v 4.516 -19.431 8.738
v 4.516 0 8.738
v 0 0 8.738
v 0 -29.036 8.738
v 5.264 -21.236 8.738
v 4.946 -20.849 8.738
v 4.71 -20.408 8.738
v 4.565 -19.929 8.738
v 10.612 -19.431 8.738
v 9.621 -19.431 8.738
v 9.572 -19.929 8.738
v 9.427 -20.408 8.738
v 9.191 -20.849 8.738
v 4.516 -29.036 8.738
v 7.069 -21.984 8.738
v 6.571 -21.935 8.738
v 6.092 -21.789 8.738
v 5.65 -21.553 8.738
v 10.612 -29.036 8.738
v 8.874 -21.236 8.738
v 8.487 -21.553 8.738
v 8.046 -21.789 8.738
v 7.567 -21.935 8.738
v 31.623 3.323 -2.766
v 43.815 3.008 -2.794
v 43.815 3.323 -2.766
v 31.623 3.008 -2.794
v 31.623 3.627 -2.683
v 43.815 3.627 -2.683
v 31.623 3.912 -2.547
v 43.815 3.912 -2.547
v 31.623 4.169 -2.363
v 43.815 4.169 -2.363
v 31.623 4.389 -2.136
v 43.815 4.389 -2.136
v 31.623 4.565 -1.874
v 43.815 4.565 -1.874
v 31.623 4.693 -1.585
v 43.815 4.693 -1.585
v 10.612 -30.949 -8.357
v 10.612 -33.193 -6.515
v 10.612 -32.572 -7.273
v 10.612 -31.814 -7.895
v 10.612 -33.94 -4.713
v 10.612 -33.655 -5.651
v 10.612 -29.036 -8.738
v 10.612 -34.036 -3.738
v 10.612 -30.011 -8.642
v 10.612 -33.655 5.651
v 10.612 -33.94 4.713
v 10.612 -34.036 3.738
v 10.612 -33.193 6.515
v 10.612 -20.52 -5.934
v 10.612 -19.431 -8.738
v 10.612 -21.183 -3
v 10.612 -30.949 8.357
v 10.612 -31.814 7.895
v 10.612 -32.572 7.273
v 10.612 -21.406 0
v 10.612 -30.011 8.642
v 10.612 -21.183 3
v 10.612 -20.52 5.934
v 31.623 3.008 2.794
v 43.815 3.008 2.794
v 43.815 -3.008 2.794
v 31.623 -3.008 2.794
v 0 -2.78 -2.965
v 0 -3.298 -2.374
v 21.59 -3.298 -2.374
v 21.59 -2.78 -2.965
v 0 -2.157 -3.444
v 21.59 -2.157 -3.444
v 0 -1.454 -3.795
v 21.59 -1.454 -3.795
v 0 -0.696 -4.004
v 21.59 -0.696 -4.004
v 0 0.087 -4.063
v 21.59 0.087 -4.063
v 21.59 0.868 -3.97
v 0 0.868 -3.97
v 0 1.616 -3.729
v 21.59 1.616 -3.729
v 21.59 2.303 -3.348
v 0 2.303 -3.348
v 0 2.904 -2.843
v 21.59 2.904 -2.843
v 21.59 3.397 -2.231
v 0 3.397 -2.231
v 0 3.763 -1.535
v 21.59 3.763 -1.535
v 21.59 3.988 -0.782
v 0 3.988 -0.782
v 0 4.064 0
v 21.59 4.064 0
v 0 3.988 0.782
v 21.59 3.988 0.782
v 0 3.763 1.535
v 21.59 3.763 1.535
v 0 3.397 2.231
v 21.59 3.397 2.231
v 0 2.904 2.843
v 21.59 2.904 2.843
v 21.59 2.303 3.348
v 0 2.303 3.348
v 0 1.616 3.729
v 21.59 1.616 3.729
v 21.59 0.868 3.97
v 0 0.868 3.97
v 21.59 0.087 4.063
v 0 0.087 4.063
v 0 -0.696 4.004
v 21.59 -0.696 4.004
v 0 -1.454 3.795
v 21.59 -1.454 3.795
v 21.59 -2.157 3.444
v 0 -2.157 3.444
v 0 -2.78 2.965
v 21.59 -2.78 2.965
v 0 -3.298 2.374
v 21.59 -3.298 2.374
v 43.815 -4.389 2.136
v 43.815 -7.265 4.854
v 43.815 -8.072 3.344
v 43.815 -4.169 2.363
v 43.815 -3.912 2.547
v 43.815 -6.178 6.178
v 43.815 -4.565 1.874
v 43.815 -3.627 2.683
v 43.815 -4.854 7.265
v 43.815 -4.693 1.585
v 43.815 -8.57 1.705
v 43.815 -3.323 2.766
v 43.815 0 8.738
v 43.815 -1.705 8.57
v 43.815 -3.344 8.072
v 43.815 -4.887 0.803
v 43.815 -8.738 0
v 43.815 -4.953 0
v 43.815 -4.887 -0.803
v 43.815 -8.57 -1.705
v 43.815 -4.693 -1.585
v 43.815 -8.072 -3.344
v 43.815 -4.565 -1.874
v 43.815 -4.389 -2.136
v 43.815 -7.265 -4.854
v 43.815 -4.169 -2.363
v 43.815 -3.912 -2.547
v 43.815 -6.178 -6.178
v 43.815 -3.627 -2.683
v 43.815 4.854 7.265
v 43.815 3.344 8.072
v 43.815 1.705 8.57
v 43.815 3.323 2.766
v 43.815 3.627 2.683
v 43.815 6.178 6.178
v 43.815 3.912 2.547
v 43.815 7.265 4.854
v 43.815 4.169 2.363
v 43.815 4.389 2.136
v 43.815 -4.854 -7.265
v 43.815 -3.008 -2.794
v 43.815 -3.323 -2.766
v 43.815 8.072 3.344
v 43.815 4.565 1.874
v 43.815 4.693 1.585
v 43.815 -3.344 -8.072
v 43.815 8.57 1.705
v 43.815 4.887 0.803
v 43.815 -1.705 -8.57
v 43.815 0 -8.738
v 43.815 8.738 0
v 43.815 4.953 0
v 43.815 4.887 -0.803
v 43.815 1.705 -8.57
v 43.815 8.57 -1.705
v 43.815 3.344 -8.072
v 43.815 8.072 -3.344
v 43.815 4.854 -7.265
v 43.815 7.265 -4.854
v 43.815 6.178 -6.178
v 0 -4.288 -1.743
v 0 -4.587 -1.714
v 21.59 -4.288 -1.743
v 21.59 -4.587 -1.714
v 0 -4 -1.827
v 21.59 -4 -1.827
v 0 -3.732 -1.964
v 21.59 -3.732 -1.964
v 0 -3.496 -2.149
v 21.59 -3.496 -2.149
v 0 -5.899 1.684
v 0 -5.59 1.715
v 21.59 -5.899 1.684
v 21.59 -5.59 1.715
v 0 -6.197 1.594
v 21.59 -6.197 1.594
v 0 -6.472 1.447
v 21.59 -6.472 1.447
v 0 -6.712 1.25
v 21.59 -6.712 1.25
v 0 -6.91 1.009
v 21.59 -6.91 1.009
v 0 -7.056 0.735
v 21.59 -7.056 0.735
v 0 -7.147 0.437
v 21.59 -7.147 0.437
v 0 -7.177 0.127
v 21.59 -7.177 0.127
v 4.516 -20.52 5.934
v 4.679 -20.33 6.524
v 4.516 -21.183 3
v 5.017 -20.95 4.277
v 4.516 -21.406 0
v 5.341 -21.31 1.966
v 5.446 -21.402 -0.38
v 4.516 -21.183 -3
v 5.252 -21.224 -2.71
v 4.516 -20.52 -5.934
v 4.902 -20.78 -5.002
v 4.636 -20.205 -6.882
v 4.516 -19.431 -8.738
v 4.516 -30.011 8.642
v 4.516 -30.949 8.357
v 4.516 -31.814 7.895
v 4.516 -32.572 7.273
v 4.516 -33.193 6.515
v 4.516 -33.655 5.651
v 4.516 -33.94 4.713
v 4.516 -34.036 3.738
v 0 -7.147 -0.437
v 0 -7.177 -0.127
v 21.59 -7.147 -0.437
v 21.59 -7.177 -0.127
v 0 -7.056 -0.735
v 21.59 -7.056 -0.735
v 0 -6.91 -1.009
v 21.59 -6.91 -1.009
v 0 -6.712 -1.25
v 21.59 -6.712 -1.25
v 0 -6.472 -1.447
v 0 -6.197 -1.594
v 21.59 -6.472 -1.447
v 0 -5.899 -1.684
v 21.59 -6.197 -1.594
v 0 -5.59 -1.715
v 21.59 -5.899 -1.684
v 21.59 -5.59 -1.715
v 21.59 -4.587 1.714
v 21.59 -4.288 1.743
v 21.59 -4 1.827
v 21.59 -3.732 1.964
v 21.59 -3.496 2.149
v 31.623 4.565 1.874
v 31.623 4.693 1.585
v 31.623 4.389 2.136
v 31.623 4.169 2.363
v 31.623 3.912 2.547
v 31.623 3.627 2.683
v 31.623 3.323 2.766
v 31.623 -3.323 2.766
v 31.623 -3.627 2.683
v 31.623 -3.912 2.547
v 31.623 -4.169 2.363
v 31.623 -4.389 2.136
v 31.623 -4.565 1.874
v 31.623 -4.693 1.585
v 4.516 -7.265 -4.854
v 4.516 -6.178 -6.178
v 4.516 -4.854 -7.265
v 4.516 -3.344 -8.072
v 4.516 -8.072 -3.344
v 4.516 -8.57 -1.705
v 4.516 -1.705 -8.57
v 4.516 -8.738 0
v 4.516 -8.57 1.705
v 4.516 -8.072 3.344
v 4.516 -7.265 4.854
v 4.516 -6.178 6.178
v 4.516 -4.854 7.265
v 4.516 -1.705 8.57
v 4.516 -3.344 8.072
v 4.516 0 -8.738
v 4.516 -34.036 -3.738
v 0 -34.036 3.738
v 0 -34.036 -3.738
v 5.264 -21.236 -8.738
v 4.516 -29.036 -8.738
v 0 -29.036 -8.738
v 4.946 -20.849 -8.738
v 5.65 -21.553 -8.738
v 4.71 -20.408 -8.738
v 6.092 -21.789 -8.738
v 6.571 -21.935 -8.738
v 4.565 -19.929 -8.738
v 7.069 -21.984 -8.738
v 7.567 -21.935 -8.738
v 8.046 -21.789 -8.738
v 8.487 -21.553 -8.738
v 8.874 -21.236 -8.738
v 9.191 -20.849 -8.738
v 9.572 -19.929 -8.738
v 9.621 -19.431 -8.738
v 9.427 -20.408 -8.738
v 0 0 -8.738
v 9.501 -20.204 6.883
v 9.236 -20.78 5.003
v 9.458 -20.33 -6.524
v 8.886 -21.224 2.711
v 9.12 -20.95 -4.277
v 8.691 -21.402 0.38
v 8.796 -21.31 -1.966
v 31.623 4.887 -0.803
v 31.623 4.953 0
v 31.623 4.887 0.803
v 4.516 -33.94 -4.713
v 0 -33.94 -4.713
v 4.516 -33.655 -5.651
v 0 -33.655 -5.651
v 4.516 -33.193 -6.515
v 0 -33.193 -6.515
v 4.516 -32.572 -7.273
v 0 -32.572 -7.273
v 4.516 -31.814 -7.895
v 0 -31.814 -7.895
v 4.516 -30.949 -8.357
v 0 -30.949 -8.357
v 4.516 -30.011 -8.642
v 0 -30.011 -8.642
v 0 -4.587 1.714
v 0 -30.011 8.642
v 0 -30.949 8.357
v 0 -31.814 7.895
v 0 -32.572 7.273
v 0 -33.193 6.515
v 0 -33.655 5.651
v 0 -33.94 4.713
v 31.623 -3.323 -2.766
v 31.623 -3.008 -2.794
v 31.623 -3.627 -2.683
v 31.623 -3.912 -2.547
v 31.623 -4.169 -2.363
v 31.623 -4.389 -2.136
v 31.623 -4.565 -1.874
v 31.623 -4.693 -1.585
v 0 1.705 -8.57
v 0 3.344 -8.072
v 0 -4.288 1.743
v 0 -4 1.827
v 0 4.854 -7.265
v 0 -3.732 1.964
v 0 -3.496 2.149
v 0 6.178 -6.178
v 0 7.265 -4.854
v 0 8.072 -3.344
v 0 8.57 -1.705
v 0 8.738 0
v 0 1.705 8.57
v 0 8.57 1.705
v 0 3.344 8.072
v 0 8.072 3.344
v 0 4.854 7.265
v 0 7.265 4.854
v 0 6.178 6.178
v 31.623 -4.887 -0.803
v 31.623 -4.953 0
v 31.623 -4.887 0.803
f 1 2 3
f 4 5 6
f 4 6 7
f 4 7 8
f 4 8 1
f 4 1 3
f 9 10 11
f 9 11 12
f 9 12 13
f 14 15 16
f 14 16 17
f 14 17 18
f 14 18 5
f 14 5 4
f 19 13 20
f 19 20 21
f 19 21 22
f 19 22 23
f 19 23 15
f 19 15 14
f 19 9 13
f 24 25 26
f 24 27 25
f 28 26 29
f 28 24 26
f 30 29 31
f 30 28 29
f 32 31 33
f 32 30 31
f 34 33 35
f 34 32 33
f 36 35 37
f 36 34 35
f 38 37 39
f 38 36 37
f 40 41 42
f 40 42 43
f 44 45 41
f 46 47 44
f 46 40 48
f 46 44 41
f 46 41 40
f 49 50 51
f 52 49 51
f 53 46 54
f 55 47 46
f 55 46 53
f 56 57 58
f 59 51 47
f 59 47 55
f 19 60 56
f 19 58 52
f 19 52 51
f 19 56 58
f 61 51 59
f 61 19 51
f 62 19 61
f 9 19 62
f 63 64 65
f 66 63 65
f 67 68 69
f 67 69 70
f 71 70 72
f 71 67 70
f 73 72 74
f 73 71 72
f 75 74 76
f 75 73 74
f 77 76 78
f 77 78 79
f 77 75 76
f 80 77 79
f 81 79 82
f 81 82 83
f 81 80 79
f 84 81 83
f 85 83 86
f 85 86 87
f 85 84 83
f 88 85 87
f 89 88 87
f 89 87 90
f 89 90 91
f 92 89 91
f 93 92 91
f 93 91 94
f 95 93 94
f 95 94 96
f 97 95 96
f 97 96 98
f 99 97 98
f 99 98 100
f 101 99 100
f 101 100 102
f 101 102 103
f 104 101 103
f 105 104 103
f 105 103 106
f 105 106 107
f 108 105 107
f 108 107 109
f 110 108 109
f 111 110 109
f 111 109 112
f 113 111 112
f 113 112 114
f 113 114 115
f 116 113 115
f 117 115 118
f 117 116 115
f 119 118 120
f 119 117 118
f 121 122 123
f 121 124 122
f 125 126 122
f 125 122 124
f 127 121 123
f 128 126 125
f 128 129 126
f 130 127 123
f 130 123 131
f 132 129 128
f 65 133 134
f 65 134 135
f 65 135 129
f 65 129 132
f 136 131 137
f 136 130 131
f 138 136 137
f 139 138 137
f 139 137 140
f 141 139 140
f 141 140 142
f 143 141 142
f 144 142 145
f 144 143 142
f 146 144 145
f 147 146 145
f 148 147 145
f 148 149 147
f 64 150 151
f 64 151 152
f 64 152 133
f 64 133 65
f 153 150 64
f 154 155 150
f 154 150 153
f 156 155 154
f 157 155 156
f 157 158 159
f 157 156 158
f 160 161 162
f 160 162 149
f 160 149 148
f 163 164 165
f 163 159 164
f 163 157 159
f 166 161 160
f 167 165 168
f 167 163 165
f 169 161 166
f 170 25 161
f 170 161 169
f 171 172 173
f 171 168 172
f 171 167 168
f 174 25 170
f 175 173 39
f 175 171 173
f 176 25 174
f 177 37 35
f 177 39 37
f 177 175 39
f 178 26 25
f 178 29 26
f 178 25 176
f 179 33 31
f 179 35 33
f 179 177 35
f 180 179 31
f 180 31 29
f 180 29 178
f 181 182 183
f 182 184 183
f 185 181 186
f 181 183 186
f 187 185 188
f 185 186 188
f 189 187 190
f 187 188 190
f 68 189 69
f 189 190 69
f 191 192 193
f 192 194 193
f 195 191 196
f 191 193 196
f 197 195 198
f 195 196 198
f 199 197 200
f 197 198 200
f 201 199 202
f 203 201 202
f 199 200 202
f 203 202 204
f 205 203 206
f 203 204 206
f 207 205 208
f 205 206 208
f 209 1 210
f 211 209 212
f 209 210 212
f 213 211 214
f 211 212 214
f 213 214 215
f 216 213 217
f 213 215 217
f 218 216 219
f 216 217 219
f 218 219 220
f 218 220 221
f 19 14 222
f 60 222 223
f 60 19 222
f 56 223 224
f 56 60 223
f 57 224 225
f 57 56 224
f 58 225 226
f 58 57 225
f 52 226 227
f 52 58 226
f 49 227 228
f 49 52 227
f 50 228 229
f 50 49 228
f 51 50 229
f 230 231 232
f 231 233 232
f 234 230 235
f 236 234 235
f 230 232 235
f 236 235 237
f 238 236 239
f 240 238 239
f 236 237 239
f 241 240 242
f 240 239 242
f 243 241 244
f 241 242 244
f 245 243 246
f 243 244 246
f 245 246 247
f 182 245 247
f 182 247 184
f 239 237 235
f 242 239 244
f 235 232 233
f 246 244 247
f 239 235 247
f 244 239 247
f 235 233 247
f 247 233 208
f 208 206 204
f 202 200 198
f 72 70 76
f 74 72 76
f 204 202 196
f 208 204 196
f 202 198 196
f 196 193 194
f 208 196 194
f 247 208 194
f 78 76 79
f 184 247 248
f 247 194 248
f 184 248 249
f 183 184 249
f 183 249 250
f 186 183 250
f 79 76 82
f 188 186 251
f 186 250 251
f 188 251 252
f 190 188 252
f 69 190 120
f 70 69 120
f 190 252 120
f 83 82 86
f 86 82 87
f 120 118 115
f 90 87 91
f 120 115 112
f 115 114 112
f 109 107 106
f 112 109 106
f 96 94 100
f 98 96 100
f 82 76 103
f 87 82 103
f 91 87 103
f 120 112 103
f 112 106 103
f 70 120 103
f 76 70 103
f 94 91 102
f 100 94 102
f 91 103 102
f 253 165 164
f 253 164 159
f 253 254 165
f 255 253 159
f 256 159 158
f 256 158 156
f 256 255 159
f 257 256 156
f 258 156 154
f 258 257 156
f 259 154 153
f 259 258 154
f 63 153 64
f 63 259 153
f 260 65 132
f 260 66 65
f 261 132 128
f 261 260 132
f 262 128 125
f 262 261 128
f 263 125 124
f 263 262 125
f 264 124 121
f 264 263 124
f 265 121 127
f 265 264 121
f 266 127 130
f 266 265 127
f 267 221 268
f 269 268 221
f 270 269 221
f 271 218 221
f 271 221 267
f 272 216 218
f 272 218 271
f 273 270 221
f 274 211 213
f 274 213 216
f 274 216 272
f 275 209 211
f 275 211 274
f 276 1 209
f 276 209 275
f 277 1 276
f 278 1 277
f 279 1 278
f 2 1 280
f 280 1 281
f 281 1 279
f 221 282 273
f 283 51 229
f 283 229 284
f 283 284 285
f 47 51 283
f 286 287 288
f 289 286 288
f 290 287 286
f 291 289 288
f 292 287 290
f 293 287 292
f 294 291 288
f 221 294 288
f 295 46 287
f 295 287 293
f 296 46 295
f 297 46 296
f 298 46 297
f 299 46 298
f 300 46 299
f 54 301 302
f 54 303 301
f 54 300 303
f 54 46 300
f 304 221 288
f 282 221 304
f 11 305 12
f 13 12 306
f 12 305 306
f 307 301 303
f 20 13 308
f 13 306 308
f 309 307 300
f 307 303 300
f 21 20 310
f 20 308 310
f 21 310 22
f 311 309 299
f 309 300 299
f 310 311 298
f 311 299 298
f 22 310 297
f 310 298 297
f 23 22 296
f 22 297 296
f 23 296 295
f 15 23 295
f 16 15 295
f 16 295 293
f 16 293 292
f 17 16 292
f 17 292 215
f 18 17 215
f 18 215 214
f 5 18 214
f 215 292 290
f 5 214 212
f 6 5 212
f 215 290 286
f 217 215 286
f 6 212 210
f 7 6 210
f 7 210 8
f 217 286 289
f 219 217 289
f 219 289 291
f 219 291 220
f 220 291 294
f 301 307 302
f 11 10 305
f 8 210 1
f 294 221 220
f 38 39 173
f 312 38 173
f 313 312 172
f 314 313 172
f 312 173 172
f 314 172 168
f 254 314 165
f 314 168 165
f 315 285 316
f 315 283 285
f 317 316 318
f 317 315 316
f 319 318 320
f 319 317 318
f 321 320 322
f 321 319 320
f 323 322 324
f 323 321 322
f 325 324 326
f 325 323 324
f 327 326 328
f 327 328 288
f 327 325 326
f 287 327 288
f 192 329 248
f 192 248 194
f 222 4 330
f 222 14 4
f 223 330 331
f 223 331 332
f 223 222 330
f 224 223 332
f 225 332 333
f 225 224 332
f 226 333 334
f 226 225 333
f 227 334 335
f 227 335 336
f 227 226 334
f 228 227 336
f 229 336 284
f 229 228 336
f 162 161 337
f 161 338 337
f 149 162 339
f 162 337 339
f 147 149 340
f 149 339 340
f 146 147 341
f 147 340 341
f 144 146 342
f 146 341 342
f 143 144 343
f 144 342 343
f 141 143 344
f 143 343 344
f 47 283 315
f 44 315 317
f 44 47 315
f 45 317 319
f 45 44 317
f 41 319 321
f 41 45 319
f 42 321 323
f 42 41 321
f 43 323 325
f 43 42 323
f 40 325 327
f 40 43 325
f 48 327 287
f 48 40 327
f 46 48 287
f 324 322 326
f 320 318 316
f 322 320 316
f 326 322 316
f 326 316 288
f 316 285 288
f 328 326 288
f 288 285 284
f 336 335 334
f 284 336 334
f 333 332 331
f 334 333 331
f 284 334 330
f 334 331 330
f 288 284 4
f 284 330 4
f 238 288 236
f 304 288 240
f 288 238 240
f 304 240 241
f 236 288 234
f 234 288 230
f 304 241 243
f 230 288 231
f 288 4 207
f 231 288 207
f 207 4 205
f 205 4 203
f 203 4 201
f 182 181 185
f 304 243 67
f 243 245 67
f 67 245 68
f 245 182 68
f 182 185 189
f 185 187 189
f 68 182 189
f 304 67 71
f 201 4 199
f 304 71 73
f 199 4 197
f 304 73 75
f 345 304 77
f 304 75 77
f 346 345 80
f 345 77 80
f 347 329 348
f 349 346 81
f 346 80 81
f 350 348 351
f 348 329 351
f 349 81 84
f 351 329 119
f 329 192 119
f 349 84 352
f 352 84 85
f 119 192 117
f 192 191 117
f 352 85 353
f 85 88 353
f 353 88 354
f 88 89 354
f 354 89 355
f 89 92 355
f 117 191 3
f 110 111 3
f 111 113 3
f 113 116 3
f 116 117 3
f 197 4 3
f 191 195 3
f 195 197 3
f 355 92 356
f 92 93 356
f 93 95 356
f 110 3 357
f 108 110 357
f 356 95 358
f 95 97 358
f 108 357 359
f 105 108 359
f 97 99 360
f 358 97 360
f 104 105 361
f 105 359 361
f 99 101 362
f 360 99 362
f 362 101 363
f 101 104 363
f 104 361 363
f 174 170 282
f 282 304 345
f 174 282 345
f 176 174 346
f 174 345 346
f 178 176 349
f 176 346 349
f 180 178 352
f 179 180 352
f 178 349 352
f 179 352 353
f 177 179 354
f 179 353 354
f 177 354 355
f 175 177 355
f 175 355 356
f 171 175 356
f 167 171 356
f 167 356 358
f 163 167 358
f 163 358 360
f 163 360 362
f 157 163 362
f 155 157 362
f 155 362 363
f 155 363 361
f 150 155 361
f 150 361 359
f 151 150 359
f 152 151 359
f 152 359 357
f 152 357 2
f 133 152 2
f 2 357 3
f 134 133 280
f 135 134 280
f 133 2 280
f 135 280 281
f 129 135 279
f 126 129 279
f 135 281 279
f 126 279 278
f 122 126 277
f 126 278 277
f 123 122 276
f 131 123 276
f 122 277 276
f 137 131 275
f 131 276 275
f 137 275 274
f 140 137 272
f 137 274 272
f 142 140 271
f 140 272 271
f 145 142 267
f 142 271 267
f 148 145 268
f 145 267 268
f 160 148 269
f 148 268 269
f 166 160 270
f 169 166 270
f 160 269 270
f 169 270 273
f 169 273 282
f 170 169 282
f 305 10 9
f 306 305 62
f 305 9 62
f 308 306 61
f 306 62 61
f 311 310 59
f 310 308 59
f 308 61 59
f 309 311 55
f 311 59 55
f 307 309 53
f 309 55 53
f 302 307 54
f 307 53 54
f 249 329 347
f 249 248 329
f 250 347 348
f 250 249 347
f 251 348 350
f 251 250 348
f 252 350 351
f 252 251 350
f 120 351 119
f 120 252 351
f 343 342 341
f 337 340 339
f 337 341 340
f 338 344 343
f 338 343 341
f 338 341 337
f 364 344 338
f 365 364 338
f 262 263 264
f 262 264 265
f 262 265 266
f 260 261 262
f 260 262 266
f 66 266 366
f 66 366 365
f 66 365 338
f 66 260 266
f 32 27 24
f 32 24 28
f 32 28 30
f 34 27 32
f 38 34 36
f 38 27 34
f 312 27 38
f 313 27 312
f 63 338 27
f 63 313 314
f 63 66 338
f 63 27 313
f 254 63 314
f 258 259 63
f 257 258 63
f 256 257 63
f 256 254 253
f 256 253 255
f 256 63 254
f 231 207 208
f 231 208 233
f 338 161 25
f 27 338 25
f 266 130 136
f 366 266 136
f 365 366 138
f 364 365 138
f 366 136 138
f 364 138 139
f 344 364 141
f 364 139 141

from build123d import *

# Parameters (mm, degrees)
SKETCH1_R           = 8.7376
BOSS_EXTRUDE1_DEPTH = 43.815
BOSS_EXTRUDE3_DEPTH = 4.516000112
FILLET2_R           = 5
BOSS_EXTRUDE4_START = 6.096
BOSS_EXTRUDE4_DEPTH = 6.096
CUT_EXTRUDE8_DEPTH  = 6.096
CUT_EXTRUDE10_DEPTH = 12.192
FILLET11_R          = 1.778
SKETCH25_R          = 2.5527
CUT_EXTRUDE14_DEPTH = 59.168600946
CUT_EXTRUDE15_DEPTH = 21.59
FILLET12_R          = 1.5875


with BuildPart() as part:
    # Sketch1 → Boss-Extrude1 (new body)
    with BuildSketch(Plane.YZ):
        with Locations(Location((0, 0, 0), (0, 0, 270))):
            Circle(SKETCH1_R)
    extrude(amount=BOSS_EXTRUDE1_DEPTH)

    # Sketch10 → Boss-Extrude3 (add)
    with BuildSketch(Plane(origin=(0, 0, 0), x_dir=(0, -1, 0), z_dir=(-1, 0, 0))):
        with BuildLine():
            Line((0, 8.7376), (34.036, 8.7376))
            Line((34.036, 8.7376), (34.036, -8.7376))
            Line((34.036, -8.7376), (0, -8.7376))
            ThreePointArc((0, -8.7376), (8.7376, 0), (0, 8.7376))
        make_face()
    extrude(amount=-BOSS_EXTRUDE3_DEPTH)

    # Fillet2
    fillet2_edges = [part.edges().sort_by_distance(p)[0] for p in [
        (2.258000056, -34.036, 8.7376),
        (2.258000056, -34.036, -8.7376),
    ]]
    fillet(fillet2_edges, radius=FILLET2_R)

    # Sketch15 → Boss-Extrude4 (add)
    with BuildSketch(Plane.YZ.offset(4.516000112).offset(BOSS_EXTRUDE4_START)):
        with BuildLine():
            Line((-18.796, 8.7376), (-29.036, 8.7376))
            ThreePointArc((-29.036, 8.7376), (-32.571533906, 7.273133906), (-34.036, 3.7376))
            Line((-34.036, 3.7376), (-34.036, -3.7376))
            ThreePointArc((-34.036, -3.7376), (-32.571533906, -7.273133906), (-29.036, -8.7376))
            Line((-29.036, -8.7376), (-18.796, -8.7376))
            Line((-18.796, -8.7376), (-18.796, 8.7376))
        make_face()
    extrude(amount=-BOSS_EXTRUDE4_DEPTH)

    # Sketch21 → Cut-Extrude8 (cut)
    with BuildSketch(Plane.YZ.offset(10.612000112)):
        with BuildLine():
            Line((-19.431, -8.7376), (-18.796, -8.7376))
            Line((-18.796, -8.7376), (-18.796, 8.7376))
            Line((-18.796, 8.7376), (-19.431, 8.7376))
            ThreePointArc((-19.431, 8.7376), (-21.405517007, 0), (-19.431, -8.7376))
        make_face()
    extrude(amount=-CUT_EXTRUDE8_DEPTH, mode=Mode.SUBTRACT)

    # Sketch22 → Cut-Extrude10 (cut)
    with BuildSketch(Plane.YZ.offset(43.815)):
        with BuildLine():
            Line((-4.089715516, -2.794), (4.089715516, -2.794))
            ThreePointArc((4.089715516, -2.794), (4.953, 0), (4.089715516, 2.794))
            Line((4.089715516, 2.794), (-4.089715516, 2.794))
            ThreePointArc((-4.089715516, 2.794), (-4.953, 0), (-4.089715516, -2.794))
        make_face()
    extrude(amount=-CUT_EXTRUDE10_DEPTH, mode=Mode.SUBTRACT)

    # Fillet11
    fillet11_edges = [part.edges().sort_by_distance(p)[0] for p in [
        (37.719, 4.089715516, 2.794),
        (37.719, 4.089715516, -2.794),
        (37.719, -4.089715516, -2.794),
        (37.719, -4.089715516, 2.794),
    ]]
    fillet(fillet11_edges, radius=FILLET11_R)

    # Sketch25 → Cut-Extrude14 (cut, through all)
    with BuildSketch(Plane(origin=(0, 0, -8.7376), x_dir=(1, 0, 0), z_dir=(0, 0, -1))):
        with Locations((7.068700112, 19.431)):
            Circle(SKETCH25_R)
    extrude(amount=-CUT_EXTRUDE14_DEPTH, mode=Mode.SUBTRACT)

    # Sketch26 → Cut-Extrude15 (cut)
    with BuildSketch(Plane(origin=(0, 0, 0), x_dir=(0, -1, 0), z_dir=(-1, 0, 0))):
        with BuildLine():
            Line((3.684641875, 1.7145), (7.177141875, 1.7145))
            Line((7.177141875, 1.7145), (7.177141875, -1.7145))
            Line((7.177141875, -1.7145), (3.684641875, -1.7145))
            ThreePointArc((3.684641875, -1.7145), (-4.064, 0), (3.684641875, 1.7145))
        make_face()
    extrude(amount=-CUT_EXTRUDE15_DEPTH, mode=Mode.SUBTRACT)

    # Fillet12
    fillet12_edges = [part.edges().sort_by_distance(p)[0] for p in [
        (10.795, -3.684641875, -1.7145),
        (10.795, -3.684641875, 1.7145),
        (10.795, -7.177141875, 1.7145),
        (10.795, -7.177141875, -1.7145),
    ]]
    fillet(fillet12_edges, radius=FILLET12_R)


solid = part.part
